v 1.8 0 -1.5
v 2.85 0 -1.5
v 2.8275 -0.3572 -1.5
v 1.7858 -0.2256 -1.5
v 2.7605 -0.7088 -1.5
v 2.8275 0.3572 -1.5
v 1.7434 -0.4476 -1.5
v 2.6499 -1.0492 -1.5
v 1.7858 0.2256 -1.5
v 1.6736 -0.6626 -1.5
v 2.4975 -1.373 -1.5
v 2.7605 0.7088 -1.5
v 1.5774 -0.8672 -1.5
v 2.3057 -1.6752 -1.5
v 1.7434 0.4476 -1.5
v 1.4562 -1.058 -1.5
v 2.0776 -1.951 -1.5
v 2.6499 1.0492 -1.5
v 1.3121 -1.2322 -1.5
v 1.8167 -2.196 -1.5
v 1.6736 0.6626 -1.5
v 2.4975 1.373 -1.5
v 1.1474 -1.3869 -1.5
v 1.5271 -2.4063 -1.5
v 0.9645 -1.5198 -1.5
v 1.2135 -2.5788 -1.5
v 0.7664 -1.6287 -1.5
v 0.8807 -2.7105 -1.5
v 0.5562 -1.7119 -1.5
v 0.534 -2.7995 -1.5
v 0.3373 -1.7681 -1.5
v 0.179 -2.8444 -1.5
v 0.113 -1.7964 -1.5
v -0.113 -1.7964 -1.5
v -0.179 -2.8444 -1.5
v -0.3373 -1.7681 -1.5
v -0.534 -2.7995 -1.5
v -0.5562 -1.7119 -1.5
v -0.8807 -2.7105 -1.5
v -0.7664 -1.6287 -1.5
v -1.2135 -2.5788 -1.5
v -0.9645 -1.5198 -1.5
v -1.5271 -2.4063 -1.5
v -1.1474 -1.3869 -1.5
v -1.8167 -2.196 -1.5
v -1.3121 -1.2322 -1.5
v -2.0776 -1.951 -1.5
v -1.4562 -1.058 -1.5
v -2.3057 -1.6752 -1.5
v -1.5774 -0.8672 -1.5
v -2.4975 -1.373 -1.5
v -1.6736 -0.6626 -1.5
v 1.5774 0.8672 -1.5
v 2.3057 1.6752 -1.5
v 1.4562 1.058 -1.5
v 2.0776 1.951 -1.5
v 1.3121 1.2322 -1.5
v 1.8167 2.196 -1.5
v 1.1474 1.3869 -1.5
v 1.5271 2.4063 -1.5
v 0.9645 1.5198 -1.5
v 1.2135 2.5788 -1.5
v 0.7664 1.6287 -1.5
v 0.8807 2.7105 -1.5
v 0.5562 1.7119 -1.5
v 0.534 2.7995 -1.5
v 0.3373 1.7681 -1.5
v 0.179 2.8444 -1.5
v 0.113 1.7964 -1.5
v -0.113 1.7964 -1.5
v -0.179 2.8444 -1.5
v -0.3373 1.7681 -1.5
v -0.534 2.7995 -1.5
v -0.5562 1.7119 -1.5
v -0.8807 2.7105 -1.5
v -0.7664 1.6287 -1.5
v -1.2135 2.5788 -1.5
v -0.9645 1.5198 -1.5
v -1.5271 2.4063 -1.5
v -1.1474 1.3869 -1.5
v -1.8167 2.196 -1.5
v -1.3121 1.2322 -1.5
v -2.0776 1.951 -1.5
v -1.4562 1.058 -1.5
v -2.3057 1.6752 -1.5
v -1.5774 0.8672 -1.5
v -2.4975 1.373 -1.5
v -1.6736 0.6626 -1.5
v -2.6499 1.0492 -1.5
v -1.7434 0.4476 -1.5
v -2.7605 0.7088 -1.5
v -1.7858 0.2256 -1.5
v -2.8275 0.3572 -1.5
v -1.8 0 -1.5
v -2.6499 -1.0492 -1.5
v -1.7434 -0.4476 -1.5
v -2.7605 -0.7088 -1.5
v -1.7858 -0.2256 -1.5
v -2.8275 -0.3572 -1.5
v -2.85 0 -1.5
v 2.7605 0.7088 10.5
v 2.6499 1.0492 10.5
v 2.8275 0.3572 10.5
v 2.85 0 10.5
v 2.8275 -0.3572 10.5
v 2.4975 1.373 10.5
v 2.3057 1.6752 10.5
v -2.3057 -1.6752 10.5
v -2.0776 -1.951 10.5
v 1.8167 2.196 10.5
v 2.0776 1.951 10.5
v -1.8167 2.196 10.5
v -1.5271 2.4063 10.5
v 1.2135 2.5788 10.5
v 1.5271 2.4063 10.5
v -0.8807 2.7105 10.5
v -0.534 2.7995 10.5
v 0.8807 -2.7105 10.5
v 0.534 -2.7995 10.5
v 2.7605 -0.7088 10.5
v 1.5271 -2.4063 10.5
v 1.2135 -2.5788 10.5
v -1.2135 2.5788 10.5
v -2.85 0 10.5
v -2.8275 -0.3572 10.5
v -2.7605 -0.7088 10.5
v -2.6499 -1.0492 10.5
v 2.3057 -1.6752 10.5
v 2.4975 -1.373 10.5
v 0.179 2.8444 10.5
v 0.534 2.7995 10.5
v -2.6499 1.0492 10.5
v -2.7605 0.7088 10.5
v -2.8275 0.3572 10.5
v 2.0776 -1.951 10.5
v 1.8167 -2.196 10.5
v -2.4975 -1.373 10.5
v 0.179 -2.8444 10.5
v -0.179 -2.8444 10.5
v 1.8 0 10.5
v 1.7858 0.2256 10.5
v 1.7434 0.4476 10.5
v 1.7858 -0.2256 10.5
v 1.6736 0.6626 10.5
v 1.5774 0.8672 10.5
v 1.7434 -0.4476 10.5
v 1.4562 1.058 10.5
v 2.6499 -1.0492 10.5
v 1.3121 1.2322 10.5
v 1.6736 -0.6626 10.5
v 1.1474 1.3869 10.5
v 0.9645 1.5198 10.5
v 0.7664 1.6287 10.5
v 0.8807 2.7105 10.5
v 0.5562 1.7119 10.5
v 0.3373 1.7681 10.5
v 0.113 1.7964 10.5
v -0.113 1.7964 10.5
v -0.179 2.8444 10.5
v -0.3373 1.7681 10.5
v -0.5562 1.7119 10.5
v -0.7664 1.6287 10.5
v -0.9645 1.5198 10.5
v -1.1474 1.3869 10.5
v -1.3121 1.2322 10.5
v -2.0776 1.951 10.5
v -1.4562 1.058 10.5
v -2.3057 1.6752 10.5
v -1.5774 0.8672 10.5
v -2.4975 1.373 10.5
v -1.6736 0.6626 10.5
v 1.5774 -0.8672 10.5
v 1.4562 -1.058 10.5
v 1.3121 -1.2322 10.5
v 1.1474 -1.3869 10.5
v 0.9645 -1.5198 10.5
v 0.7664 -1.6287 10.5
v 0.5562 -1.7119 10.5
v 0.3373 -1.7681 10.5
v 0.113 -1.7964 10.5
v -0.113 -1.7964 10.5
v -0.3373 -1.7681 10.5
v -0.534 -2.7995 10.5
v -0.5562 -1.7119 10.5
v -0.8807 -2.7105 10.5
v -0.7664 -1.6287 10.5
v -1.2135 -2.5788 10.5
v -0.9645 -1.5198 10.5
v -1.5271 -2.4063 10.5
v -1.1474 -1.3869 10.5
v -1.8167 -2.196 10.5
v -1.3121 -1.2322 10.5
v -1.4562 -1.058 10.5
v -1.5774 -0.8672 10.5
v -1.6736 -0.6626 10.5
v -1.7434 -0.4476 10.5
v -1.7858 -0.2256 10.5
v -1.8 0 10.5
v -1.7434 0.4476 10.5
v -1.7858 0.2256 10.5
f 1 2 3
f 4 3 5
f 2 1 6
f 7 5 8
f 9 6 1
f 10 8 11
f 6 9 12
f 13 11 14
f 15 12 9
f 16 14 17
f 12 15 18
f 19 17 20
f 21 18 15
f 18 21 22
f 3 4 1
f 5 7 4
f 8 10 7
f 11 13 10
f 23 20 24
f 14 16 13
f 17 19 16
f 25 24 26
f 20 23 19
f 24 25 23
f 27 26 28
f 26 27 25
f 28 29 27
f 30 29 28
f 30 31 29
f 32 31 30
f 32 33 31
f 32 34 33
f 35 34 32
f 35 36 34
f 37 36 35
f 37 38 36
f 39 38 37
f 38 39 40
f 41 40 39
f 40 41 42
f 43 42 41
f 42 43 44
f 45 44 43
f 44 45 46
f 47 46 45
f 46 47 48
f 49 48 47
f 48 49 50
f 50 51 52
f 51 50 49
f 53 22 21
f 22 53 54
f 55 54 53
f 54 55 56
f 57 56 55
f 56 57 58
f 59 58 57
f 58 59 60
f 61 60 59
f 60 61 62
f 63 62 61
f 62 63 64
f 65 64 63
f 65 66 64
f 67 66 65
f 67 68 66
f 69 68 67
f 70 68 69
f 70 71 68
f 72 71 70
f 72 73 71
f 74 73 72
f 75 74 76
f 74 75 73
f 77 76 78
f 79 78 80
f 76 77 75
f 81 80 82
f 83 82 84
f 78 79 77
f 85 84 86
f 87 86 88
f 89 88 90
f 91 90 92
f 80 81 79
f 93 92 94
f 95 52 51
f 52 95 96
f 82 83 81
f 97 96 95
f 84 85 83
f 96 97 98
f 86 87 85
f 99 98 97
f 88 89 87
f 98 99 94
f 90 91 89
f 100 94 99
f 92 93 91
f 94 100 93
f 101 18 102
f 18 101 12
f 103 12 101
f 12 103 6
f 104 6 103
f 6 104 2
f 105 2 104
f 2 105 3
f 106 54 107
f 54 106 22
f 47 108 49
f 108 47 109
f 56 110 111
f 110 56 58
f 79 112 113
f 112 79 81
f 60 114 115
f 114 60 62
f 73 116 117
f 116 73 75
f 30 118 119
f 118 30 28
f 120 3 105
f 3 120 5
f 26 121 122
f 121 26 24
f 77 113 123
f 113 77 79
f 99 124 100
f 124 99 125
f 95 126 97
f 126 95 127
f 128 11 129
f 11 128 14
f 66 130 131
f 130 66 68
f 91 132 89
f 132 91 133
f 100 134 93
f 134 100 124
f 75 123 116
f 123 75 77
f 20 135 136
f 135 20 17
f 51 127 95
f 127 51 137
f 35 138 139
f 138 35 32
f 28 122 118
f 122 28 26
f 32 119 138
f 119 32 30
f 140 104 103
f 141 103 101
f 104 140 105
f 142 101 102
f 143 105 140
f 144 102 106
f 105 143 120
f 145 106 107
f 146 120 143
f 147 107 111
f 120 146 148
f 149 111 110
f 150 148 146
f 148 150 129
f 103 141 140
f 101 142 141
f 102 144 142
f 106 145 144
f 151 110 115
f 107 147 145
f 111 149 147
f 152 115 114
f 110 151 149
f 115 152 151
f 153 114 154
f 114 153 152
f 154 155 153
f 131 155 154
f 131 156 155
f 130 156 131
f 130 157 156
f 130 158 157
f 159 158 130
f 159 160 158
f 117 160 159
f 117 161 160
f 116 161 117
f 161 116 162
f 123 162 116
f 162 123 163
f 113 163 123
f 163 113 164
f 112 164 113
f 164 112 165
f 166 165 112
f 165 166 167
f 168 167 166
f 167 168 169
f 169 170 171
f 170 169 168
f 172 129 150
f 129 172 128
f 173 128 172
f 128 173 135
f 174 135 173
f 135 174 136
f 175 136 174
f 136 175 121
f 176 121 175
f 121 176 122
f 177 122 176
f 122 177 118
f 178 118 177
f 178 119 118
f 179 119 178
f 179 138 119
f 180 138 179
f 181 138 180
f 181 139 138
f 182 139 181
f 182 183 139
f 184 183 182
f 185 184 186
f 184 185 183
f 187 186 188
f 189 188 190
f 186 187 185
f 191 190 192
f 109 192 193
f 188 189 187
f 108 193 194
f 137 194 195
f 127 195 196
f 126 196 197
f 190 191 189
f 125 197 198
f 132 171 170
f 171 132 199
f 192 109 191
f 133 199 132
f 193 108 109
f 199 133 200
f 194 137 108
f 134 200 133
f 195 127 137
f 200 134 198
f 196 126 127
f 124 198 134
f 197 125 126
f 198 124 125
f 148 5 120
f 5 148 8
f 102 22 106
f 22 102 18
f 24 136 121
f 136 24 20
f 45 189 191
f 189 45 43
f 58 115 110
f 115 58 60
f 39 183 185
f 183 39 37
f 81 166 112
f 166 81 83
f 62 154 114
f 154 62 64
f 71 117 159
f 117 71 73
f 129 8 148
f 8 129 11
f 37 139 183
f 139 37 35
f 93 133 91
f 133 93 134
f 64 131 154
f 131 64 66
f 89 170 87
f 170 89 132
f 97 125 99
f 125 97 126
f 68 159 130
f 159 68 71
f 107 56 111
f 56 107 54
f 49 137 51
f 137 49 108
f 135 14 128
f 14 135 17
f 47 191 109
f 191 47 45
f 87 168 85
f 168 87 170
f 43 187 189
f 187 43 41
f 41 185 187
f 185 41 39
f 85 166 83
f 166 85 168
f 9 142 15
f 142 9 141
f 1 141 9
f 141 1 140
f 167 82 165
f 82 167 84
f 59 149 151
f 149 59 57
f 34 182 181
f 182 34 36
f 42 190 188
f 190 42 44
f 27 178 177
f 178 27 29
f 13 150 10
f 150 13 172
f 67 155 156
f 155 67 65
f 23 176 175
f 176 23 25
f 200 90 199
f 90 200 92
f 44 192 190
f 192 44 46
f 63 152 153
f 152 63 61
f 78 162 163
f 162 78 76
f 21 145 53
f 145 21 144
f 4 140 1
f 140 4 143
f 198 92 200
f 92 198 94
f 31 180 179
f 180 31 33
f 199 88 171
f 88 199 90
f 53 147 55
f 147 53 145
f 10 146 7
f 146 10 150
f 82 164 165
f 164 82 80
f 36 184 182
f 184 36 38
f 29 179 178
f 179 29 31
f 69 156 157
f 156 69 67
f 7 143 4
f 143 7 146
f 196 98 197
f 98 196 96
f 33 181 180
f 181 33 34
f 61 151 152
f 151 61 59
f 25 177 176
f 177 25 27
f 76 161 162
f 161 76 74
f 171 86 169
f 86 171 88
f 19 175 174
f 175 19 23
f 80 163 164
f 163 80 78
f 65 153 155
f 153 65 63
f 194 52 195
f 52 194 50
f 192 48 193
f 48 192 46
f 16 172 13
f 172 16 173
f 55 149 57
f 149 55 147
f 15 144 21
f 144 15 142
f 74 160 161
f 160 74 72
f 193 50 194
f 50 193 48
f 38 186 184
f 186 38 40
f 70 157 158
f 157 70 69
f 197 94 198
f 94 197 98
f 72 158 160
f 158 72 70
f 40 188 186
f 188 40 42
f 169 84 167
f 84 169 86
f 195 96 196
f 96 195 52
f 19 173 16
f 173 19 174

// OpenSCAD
$fn = 50;


difference() {
	union() {
		translate(v = [0, 0, -1.5000000000]) {
			cylinder(h = 3, r = 1.0000000000);
		}
		translate(v = [0, 0, -1.5000000000]) {
			cylinder(h = 12, r = 2.8500000000);
		}
	}
	union() {
		translate(v = [0, 0, -100.0000000000]) {
			cylinder(h = 200, r = 1.8000000000);
		}
	}
}
